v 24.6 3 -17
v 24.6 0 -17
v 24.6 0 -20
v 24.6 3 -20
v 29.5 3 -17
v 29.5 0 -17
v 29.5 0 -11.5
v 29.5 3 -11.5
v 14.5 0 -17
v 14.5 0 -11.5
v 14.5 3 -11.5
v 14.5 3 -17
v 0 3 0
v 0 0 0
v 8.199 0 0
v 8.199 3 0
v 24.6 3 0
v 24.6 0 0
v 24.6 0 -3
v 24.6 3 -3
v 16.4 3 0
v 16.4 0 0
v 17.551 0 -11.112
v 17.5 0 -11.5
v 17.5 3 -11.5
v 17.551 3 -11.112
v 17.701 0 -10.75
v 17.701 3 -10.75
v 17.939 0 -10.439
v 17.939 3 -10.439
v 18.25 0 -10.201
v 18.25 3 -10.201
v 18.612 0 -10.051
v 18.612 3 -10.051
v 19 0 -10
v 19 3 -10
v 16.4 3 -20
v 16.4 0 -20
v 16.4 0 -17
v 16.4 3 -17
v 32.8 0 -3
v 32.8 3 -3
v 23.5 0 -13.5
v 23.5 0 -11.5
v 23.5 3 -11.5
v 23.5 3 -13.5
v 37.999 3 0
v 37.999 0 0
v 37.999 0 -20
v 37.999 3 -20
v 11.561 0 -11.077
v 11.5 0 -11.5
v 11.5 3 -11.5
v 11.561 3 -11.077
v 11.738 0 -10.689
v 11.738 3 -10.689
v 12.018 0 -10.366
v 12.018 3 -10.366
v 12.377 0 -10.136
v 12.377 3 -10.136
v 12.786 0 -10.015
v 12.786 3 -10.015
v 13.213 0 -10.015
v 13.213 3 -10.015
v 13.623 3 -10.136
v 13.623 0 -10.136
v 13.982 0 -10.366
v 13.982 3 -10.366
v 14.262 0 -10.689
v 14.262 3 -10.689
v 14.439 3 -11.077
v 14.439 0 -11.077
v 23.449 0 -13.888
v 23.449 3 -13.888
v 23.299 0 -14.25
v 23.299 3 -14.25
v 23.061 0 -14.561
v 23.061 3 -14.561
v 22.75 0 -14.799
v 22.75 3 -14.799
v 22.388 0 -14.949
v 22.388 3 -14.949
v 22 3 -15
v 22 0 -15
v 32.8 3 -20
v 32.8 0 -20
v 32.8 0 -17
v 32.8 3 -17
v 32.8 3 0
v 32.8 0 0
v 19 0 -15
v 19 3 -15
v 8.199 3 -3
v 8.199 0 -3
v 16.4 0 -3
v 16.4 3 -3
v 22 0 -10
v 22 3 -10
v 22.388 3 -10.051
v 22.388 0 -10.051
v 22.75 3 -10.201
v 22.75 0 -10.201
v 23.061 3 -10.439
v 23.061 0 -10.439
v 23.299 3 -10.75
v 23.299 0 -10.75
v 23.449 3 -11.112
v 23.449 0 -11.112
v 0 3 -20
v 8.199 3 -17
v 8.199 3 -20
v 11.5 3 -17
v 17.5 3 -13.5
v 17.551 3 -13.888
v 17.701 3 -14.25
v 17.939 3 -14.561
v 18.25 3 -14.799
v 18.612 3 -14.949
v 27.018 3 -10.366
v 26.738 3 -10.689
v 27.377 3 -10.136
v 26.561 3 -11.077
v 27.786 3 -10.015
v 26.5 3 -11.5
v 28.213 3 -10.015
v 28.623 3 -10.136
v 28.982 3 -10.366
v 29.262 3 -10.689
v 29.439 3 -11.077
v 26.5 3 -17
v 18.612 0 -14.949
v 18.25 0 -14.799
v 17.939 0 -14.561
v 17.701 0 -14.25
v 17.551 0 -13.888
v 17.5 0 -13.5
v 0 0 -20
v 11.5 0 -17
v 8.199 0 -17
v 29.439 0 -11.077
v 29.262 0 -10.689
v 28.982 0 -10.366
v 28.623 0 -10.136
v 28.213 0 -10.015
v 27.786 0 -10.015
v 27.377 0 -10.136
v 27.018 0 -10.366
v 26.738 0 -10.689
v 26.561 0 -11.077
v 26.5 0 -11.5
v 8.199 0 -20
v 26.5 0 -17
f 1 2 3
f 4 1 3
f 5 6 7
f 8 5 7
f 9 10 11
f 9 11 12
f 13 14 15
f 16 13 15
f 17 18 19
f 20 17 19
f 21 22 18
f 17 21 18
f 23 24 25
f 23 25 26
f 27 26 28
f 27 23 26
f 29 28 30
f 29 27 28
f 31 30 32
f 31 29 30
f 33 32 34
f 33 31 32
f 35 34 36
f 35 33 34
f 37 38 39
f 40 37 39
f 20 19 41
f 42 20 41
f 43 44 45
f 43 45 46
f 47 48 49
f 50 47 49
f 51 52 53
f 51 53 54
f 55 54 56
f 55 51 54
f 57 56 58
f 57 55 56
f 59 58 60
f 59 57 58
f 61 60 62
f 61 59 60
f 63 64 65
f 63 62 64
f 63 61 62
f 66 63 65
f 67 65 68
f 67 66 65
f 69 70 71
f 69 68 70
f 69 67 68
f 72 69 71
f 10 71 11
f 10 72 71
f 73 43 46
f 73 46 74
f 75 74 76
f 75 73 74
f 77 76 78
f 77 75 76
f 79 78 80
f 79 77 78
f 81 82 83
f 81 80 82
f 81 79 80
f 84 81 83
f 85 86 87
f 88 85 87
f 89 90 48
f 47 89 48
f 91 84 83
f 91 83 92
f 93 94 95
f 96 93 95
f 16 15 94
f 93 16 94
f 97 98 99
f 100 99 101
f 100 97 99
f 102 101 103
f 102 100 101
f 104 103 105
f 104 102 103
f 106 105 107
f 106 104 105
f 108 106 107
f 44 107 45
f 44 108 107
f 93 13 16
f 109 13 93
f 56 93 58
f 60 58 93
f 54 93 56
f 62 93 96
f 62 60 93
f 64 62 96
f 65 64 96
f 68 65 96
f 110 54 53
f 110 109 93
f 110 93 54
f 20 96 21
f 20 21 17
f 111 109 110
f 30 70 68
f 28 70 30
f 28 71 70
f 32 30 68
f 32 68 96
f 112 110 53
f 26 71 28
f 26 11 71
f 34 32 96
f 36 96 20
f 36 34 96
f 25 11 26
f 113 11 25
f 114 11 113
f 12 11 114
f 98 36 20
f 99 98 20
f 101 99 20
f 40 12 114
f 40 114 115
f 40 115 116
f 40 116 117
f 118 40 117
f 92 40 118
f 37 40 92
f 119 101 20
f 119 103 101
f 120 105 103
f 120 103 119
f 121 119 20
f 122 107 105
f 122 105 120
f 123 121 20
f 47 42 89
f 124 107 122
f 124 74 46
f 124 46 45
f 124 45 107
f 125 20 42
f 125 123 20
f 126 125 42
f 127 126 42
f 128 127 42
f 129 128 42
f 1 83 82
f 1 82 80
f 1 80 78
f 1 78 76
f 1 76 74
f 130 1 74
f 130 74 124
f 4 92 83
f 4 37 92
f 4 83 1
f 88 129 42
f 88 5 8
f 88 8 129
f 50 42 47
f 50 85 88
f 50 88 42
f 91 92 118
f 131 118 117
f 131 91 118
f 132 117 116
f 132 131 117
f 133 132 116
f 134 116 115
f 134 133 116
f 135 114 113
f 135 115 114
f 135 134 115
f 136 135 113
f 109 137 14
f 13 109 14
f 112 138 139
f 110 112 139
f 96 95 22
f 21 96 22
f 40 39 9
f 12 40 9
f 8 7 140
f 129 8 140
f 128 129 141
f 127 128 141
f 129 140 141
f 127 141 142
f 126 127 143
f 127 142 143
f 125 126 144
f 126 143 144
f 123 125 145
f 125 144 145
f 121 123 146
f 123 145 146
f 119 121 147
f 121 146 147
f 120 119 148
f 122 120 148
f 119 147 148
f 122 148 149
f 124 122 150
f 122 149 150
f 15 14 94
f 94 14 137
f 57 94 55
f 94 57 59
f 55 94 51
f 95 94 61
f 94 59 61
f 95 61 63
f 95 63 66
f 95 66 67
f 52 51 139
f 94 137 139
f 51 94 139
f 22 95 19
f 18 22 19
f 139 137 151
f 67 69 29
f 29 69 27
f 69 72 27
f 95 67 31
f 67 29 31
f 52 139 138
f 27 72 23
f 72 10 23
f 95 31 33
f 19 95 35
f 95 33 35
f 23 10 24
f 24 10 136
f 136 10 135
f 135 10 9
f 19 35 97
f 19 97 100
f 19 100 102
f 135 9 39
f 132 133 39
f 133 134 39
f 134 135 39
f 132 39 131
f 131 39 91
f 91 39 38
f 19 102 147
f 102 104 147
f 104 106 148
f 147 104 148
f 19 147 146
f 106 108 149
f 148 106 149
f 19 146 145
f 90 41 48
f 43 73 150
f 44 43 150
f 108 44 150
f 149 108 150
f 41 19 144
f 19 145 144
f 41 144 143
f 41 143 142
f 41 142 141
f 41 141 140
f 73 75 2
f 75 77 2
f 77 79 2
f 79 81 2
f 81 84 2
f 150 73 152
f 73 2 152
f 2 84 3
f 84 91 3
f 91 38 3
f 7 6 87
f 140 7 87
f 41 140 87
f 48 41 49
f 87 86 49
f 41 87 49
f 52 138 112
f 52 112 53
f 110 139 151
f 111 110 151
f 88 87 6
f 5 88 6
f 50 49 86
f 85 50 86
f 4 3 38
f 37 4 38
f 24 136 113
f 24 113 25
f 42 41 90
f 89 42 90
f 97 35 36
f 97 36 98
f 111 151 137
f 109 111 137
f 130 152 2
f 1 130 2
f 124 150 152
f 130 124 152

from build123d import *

# Parameters (mm, degrees)
AUFSATZ_LINEAR_AUSTRAGEN1_DEPTH = 3
SCHNITT_LINEAR_AUSTRAGEN1_REACH = 5


with BuildPart() as part:
    # Skizze1 → Aufsatz-Linear austragen1 (new body)
    with BuildSketch(Plane(origin=(0, 0, 0), x_dir=(1, 0, 0), z_dir=(0, 1, 0))):
        Polygon((0, 0), (8.199374, 0), (8.199374, 3.000248), (16.400272, 3.000248), (16.400272, 0), (24.599646, 0), (24.599646, 3.000248), (32.80029, 3.000248), (32.80029, 0), (37.999416, 0), (37.999416, 20), (32.80029, 20), (32.80029, 17.000006), (24.599646, 17.000006), (24.599646, 20), (16.400272, 20), (16.400272, 17.000006), (8.199374, 17.000006), (8.199374, 20), (0, 20), align=None)
    extrude(amount=AUFSATZ_LINEAR_AUSTRAGEN1_DEPTH)

    # Skizze2 → Schnitt-Linear austragen1 (cut, up to next)
    with BuildSketch(Plane.XZ, mode=Mode.PRIVATE) as schnitt_linear_austragen1_sk1:
        with BuildLine():
            Line((11.499959, -20), (11.499959, -11.5))
            ThreePointArc((11.499959, -11.5), (12.999959, -10), (14.499959, -11.5))
            Line((14.499959, -11.5), (14.499959, -20))
            Line((14.499959, -20), (11.499959, -20))
        make_face()
    schnitt_linear_austragen1_tool1 = extrude(schnitt_linear_austragen1_sk1.sketch, amount=-SCHNITT_LINEAR_AUSTRAGEN1_REACH, mode=Mode.PRIVATE) & part.part
    add(schnitt_linear_austragen1_tool1.solids().sort_by_distance((12.999959, 0, -15.155161))[0], mode=Mode.SUBTRACT)
    # Skizze2 → Schnitt-Linear austragen1 (cut, up to next)
    with BuildSketch(Plane.XZ, mode=Mode.PRIVATE) as schnitt_linear_austragen1_sk2:
        with BuildLine():
            Line((26.499959, -20), (29.499959, -20))
            Line((29.499959, -20), (29.499959, -11.5))
            ThreePointArc((29.499959, -11.5), (27.999959, -10), (26.499959, -11.5))
            Line((26.499959, -11.5), (26.499959, -20))
        make_face()
    schnitt_linear_austragen1_tool2 = extrude(schnitt_linear_austragen1_sk2.sketch, amount=-SCHNITT_LINEAR_AUSTRAGEN1_REACH, mode=Mode.PRIVATE) & part.part
    add(schnitt_linear_austragen1_tool2.solids().sort_by_distance((27.999959, 0, -15.155161))[0], mode=Mode.SUBTRACT)
    # Skizze2 → Schnitt-Linear austragen1 (cut, up to next)
    with BuildSketch(Plane.XZ, mode=Mode.PRIVATE) as schnitt_linear_austragen1_sk3:
        with BuildLine():
            Line((18.999959, -10), (21.999959, -10))
            ThreePointArc((21.999959, -10), (23.060619172, -10.439339828), (23.499959, -11.5))
            Line((23.499959, -11.5), (23.499959, -13.500006))
            ThreePointArc((23.499959, -13.500006), (23.060619172, -14.560666172), (21.999959, -15.000006))
            Line((21.999959, -15.000006), (18.999959, -15.000006))
            ThreePointArc((18.999959, -15.000006), (17.939298828, -14.560666172), (17.499959, -13.500006))
            Line((17.499959, -13.500006), (17.499959, -11.5))
            ThreePointArc((17.499959, -11.5), (17.939298828, -10.439339828), (18.999959, -10))
        make_face()
    schnitt_linear_austragen1_tool3 = extrude(schnitt_linear_austragen1_sk3.sketch, amount=-SCHNITT_LINEAR_AUSTRAGEN1_REACH, mode=Mode.PRIVATE) & part.part
    add(schnitt_linear_austragen1_tool3.solids().sort_by_distance((20.499959, 0, -12.500003))[0], mode=Mode.SUBTRACT)


solid = part.part
